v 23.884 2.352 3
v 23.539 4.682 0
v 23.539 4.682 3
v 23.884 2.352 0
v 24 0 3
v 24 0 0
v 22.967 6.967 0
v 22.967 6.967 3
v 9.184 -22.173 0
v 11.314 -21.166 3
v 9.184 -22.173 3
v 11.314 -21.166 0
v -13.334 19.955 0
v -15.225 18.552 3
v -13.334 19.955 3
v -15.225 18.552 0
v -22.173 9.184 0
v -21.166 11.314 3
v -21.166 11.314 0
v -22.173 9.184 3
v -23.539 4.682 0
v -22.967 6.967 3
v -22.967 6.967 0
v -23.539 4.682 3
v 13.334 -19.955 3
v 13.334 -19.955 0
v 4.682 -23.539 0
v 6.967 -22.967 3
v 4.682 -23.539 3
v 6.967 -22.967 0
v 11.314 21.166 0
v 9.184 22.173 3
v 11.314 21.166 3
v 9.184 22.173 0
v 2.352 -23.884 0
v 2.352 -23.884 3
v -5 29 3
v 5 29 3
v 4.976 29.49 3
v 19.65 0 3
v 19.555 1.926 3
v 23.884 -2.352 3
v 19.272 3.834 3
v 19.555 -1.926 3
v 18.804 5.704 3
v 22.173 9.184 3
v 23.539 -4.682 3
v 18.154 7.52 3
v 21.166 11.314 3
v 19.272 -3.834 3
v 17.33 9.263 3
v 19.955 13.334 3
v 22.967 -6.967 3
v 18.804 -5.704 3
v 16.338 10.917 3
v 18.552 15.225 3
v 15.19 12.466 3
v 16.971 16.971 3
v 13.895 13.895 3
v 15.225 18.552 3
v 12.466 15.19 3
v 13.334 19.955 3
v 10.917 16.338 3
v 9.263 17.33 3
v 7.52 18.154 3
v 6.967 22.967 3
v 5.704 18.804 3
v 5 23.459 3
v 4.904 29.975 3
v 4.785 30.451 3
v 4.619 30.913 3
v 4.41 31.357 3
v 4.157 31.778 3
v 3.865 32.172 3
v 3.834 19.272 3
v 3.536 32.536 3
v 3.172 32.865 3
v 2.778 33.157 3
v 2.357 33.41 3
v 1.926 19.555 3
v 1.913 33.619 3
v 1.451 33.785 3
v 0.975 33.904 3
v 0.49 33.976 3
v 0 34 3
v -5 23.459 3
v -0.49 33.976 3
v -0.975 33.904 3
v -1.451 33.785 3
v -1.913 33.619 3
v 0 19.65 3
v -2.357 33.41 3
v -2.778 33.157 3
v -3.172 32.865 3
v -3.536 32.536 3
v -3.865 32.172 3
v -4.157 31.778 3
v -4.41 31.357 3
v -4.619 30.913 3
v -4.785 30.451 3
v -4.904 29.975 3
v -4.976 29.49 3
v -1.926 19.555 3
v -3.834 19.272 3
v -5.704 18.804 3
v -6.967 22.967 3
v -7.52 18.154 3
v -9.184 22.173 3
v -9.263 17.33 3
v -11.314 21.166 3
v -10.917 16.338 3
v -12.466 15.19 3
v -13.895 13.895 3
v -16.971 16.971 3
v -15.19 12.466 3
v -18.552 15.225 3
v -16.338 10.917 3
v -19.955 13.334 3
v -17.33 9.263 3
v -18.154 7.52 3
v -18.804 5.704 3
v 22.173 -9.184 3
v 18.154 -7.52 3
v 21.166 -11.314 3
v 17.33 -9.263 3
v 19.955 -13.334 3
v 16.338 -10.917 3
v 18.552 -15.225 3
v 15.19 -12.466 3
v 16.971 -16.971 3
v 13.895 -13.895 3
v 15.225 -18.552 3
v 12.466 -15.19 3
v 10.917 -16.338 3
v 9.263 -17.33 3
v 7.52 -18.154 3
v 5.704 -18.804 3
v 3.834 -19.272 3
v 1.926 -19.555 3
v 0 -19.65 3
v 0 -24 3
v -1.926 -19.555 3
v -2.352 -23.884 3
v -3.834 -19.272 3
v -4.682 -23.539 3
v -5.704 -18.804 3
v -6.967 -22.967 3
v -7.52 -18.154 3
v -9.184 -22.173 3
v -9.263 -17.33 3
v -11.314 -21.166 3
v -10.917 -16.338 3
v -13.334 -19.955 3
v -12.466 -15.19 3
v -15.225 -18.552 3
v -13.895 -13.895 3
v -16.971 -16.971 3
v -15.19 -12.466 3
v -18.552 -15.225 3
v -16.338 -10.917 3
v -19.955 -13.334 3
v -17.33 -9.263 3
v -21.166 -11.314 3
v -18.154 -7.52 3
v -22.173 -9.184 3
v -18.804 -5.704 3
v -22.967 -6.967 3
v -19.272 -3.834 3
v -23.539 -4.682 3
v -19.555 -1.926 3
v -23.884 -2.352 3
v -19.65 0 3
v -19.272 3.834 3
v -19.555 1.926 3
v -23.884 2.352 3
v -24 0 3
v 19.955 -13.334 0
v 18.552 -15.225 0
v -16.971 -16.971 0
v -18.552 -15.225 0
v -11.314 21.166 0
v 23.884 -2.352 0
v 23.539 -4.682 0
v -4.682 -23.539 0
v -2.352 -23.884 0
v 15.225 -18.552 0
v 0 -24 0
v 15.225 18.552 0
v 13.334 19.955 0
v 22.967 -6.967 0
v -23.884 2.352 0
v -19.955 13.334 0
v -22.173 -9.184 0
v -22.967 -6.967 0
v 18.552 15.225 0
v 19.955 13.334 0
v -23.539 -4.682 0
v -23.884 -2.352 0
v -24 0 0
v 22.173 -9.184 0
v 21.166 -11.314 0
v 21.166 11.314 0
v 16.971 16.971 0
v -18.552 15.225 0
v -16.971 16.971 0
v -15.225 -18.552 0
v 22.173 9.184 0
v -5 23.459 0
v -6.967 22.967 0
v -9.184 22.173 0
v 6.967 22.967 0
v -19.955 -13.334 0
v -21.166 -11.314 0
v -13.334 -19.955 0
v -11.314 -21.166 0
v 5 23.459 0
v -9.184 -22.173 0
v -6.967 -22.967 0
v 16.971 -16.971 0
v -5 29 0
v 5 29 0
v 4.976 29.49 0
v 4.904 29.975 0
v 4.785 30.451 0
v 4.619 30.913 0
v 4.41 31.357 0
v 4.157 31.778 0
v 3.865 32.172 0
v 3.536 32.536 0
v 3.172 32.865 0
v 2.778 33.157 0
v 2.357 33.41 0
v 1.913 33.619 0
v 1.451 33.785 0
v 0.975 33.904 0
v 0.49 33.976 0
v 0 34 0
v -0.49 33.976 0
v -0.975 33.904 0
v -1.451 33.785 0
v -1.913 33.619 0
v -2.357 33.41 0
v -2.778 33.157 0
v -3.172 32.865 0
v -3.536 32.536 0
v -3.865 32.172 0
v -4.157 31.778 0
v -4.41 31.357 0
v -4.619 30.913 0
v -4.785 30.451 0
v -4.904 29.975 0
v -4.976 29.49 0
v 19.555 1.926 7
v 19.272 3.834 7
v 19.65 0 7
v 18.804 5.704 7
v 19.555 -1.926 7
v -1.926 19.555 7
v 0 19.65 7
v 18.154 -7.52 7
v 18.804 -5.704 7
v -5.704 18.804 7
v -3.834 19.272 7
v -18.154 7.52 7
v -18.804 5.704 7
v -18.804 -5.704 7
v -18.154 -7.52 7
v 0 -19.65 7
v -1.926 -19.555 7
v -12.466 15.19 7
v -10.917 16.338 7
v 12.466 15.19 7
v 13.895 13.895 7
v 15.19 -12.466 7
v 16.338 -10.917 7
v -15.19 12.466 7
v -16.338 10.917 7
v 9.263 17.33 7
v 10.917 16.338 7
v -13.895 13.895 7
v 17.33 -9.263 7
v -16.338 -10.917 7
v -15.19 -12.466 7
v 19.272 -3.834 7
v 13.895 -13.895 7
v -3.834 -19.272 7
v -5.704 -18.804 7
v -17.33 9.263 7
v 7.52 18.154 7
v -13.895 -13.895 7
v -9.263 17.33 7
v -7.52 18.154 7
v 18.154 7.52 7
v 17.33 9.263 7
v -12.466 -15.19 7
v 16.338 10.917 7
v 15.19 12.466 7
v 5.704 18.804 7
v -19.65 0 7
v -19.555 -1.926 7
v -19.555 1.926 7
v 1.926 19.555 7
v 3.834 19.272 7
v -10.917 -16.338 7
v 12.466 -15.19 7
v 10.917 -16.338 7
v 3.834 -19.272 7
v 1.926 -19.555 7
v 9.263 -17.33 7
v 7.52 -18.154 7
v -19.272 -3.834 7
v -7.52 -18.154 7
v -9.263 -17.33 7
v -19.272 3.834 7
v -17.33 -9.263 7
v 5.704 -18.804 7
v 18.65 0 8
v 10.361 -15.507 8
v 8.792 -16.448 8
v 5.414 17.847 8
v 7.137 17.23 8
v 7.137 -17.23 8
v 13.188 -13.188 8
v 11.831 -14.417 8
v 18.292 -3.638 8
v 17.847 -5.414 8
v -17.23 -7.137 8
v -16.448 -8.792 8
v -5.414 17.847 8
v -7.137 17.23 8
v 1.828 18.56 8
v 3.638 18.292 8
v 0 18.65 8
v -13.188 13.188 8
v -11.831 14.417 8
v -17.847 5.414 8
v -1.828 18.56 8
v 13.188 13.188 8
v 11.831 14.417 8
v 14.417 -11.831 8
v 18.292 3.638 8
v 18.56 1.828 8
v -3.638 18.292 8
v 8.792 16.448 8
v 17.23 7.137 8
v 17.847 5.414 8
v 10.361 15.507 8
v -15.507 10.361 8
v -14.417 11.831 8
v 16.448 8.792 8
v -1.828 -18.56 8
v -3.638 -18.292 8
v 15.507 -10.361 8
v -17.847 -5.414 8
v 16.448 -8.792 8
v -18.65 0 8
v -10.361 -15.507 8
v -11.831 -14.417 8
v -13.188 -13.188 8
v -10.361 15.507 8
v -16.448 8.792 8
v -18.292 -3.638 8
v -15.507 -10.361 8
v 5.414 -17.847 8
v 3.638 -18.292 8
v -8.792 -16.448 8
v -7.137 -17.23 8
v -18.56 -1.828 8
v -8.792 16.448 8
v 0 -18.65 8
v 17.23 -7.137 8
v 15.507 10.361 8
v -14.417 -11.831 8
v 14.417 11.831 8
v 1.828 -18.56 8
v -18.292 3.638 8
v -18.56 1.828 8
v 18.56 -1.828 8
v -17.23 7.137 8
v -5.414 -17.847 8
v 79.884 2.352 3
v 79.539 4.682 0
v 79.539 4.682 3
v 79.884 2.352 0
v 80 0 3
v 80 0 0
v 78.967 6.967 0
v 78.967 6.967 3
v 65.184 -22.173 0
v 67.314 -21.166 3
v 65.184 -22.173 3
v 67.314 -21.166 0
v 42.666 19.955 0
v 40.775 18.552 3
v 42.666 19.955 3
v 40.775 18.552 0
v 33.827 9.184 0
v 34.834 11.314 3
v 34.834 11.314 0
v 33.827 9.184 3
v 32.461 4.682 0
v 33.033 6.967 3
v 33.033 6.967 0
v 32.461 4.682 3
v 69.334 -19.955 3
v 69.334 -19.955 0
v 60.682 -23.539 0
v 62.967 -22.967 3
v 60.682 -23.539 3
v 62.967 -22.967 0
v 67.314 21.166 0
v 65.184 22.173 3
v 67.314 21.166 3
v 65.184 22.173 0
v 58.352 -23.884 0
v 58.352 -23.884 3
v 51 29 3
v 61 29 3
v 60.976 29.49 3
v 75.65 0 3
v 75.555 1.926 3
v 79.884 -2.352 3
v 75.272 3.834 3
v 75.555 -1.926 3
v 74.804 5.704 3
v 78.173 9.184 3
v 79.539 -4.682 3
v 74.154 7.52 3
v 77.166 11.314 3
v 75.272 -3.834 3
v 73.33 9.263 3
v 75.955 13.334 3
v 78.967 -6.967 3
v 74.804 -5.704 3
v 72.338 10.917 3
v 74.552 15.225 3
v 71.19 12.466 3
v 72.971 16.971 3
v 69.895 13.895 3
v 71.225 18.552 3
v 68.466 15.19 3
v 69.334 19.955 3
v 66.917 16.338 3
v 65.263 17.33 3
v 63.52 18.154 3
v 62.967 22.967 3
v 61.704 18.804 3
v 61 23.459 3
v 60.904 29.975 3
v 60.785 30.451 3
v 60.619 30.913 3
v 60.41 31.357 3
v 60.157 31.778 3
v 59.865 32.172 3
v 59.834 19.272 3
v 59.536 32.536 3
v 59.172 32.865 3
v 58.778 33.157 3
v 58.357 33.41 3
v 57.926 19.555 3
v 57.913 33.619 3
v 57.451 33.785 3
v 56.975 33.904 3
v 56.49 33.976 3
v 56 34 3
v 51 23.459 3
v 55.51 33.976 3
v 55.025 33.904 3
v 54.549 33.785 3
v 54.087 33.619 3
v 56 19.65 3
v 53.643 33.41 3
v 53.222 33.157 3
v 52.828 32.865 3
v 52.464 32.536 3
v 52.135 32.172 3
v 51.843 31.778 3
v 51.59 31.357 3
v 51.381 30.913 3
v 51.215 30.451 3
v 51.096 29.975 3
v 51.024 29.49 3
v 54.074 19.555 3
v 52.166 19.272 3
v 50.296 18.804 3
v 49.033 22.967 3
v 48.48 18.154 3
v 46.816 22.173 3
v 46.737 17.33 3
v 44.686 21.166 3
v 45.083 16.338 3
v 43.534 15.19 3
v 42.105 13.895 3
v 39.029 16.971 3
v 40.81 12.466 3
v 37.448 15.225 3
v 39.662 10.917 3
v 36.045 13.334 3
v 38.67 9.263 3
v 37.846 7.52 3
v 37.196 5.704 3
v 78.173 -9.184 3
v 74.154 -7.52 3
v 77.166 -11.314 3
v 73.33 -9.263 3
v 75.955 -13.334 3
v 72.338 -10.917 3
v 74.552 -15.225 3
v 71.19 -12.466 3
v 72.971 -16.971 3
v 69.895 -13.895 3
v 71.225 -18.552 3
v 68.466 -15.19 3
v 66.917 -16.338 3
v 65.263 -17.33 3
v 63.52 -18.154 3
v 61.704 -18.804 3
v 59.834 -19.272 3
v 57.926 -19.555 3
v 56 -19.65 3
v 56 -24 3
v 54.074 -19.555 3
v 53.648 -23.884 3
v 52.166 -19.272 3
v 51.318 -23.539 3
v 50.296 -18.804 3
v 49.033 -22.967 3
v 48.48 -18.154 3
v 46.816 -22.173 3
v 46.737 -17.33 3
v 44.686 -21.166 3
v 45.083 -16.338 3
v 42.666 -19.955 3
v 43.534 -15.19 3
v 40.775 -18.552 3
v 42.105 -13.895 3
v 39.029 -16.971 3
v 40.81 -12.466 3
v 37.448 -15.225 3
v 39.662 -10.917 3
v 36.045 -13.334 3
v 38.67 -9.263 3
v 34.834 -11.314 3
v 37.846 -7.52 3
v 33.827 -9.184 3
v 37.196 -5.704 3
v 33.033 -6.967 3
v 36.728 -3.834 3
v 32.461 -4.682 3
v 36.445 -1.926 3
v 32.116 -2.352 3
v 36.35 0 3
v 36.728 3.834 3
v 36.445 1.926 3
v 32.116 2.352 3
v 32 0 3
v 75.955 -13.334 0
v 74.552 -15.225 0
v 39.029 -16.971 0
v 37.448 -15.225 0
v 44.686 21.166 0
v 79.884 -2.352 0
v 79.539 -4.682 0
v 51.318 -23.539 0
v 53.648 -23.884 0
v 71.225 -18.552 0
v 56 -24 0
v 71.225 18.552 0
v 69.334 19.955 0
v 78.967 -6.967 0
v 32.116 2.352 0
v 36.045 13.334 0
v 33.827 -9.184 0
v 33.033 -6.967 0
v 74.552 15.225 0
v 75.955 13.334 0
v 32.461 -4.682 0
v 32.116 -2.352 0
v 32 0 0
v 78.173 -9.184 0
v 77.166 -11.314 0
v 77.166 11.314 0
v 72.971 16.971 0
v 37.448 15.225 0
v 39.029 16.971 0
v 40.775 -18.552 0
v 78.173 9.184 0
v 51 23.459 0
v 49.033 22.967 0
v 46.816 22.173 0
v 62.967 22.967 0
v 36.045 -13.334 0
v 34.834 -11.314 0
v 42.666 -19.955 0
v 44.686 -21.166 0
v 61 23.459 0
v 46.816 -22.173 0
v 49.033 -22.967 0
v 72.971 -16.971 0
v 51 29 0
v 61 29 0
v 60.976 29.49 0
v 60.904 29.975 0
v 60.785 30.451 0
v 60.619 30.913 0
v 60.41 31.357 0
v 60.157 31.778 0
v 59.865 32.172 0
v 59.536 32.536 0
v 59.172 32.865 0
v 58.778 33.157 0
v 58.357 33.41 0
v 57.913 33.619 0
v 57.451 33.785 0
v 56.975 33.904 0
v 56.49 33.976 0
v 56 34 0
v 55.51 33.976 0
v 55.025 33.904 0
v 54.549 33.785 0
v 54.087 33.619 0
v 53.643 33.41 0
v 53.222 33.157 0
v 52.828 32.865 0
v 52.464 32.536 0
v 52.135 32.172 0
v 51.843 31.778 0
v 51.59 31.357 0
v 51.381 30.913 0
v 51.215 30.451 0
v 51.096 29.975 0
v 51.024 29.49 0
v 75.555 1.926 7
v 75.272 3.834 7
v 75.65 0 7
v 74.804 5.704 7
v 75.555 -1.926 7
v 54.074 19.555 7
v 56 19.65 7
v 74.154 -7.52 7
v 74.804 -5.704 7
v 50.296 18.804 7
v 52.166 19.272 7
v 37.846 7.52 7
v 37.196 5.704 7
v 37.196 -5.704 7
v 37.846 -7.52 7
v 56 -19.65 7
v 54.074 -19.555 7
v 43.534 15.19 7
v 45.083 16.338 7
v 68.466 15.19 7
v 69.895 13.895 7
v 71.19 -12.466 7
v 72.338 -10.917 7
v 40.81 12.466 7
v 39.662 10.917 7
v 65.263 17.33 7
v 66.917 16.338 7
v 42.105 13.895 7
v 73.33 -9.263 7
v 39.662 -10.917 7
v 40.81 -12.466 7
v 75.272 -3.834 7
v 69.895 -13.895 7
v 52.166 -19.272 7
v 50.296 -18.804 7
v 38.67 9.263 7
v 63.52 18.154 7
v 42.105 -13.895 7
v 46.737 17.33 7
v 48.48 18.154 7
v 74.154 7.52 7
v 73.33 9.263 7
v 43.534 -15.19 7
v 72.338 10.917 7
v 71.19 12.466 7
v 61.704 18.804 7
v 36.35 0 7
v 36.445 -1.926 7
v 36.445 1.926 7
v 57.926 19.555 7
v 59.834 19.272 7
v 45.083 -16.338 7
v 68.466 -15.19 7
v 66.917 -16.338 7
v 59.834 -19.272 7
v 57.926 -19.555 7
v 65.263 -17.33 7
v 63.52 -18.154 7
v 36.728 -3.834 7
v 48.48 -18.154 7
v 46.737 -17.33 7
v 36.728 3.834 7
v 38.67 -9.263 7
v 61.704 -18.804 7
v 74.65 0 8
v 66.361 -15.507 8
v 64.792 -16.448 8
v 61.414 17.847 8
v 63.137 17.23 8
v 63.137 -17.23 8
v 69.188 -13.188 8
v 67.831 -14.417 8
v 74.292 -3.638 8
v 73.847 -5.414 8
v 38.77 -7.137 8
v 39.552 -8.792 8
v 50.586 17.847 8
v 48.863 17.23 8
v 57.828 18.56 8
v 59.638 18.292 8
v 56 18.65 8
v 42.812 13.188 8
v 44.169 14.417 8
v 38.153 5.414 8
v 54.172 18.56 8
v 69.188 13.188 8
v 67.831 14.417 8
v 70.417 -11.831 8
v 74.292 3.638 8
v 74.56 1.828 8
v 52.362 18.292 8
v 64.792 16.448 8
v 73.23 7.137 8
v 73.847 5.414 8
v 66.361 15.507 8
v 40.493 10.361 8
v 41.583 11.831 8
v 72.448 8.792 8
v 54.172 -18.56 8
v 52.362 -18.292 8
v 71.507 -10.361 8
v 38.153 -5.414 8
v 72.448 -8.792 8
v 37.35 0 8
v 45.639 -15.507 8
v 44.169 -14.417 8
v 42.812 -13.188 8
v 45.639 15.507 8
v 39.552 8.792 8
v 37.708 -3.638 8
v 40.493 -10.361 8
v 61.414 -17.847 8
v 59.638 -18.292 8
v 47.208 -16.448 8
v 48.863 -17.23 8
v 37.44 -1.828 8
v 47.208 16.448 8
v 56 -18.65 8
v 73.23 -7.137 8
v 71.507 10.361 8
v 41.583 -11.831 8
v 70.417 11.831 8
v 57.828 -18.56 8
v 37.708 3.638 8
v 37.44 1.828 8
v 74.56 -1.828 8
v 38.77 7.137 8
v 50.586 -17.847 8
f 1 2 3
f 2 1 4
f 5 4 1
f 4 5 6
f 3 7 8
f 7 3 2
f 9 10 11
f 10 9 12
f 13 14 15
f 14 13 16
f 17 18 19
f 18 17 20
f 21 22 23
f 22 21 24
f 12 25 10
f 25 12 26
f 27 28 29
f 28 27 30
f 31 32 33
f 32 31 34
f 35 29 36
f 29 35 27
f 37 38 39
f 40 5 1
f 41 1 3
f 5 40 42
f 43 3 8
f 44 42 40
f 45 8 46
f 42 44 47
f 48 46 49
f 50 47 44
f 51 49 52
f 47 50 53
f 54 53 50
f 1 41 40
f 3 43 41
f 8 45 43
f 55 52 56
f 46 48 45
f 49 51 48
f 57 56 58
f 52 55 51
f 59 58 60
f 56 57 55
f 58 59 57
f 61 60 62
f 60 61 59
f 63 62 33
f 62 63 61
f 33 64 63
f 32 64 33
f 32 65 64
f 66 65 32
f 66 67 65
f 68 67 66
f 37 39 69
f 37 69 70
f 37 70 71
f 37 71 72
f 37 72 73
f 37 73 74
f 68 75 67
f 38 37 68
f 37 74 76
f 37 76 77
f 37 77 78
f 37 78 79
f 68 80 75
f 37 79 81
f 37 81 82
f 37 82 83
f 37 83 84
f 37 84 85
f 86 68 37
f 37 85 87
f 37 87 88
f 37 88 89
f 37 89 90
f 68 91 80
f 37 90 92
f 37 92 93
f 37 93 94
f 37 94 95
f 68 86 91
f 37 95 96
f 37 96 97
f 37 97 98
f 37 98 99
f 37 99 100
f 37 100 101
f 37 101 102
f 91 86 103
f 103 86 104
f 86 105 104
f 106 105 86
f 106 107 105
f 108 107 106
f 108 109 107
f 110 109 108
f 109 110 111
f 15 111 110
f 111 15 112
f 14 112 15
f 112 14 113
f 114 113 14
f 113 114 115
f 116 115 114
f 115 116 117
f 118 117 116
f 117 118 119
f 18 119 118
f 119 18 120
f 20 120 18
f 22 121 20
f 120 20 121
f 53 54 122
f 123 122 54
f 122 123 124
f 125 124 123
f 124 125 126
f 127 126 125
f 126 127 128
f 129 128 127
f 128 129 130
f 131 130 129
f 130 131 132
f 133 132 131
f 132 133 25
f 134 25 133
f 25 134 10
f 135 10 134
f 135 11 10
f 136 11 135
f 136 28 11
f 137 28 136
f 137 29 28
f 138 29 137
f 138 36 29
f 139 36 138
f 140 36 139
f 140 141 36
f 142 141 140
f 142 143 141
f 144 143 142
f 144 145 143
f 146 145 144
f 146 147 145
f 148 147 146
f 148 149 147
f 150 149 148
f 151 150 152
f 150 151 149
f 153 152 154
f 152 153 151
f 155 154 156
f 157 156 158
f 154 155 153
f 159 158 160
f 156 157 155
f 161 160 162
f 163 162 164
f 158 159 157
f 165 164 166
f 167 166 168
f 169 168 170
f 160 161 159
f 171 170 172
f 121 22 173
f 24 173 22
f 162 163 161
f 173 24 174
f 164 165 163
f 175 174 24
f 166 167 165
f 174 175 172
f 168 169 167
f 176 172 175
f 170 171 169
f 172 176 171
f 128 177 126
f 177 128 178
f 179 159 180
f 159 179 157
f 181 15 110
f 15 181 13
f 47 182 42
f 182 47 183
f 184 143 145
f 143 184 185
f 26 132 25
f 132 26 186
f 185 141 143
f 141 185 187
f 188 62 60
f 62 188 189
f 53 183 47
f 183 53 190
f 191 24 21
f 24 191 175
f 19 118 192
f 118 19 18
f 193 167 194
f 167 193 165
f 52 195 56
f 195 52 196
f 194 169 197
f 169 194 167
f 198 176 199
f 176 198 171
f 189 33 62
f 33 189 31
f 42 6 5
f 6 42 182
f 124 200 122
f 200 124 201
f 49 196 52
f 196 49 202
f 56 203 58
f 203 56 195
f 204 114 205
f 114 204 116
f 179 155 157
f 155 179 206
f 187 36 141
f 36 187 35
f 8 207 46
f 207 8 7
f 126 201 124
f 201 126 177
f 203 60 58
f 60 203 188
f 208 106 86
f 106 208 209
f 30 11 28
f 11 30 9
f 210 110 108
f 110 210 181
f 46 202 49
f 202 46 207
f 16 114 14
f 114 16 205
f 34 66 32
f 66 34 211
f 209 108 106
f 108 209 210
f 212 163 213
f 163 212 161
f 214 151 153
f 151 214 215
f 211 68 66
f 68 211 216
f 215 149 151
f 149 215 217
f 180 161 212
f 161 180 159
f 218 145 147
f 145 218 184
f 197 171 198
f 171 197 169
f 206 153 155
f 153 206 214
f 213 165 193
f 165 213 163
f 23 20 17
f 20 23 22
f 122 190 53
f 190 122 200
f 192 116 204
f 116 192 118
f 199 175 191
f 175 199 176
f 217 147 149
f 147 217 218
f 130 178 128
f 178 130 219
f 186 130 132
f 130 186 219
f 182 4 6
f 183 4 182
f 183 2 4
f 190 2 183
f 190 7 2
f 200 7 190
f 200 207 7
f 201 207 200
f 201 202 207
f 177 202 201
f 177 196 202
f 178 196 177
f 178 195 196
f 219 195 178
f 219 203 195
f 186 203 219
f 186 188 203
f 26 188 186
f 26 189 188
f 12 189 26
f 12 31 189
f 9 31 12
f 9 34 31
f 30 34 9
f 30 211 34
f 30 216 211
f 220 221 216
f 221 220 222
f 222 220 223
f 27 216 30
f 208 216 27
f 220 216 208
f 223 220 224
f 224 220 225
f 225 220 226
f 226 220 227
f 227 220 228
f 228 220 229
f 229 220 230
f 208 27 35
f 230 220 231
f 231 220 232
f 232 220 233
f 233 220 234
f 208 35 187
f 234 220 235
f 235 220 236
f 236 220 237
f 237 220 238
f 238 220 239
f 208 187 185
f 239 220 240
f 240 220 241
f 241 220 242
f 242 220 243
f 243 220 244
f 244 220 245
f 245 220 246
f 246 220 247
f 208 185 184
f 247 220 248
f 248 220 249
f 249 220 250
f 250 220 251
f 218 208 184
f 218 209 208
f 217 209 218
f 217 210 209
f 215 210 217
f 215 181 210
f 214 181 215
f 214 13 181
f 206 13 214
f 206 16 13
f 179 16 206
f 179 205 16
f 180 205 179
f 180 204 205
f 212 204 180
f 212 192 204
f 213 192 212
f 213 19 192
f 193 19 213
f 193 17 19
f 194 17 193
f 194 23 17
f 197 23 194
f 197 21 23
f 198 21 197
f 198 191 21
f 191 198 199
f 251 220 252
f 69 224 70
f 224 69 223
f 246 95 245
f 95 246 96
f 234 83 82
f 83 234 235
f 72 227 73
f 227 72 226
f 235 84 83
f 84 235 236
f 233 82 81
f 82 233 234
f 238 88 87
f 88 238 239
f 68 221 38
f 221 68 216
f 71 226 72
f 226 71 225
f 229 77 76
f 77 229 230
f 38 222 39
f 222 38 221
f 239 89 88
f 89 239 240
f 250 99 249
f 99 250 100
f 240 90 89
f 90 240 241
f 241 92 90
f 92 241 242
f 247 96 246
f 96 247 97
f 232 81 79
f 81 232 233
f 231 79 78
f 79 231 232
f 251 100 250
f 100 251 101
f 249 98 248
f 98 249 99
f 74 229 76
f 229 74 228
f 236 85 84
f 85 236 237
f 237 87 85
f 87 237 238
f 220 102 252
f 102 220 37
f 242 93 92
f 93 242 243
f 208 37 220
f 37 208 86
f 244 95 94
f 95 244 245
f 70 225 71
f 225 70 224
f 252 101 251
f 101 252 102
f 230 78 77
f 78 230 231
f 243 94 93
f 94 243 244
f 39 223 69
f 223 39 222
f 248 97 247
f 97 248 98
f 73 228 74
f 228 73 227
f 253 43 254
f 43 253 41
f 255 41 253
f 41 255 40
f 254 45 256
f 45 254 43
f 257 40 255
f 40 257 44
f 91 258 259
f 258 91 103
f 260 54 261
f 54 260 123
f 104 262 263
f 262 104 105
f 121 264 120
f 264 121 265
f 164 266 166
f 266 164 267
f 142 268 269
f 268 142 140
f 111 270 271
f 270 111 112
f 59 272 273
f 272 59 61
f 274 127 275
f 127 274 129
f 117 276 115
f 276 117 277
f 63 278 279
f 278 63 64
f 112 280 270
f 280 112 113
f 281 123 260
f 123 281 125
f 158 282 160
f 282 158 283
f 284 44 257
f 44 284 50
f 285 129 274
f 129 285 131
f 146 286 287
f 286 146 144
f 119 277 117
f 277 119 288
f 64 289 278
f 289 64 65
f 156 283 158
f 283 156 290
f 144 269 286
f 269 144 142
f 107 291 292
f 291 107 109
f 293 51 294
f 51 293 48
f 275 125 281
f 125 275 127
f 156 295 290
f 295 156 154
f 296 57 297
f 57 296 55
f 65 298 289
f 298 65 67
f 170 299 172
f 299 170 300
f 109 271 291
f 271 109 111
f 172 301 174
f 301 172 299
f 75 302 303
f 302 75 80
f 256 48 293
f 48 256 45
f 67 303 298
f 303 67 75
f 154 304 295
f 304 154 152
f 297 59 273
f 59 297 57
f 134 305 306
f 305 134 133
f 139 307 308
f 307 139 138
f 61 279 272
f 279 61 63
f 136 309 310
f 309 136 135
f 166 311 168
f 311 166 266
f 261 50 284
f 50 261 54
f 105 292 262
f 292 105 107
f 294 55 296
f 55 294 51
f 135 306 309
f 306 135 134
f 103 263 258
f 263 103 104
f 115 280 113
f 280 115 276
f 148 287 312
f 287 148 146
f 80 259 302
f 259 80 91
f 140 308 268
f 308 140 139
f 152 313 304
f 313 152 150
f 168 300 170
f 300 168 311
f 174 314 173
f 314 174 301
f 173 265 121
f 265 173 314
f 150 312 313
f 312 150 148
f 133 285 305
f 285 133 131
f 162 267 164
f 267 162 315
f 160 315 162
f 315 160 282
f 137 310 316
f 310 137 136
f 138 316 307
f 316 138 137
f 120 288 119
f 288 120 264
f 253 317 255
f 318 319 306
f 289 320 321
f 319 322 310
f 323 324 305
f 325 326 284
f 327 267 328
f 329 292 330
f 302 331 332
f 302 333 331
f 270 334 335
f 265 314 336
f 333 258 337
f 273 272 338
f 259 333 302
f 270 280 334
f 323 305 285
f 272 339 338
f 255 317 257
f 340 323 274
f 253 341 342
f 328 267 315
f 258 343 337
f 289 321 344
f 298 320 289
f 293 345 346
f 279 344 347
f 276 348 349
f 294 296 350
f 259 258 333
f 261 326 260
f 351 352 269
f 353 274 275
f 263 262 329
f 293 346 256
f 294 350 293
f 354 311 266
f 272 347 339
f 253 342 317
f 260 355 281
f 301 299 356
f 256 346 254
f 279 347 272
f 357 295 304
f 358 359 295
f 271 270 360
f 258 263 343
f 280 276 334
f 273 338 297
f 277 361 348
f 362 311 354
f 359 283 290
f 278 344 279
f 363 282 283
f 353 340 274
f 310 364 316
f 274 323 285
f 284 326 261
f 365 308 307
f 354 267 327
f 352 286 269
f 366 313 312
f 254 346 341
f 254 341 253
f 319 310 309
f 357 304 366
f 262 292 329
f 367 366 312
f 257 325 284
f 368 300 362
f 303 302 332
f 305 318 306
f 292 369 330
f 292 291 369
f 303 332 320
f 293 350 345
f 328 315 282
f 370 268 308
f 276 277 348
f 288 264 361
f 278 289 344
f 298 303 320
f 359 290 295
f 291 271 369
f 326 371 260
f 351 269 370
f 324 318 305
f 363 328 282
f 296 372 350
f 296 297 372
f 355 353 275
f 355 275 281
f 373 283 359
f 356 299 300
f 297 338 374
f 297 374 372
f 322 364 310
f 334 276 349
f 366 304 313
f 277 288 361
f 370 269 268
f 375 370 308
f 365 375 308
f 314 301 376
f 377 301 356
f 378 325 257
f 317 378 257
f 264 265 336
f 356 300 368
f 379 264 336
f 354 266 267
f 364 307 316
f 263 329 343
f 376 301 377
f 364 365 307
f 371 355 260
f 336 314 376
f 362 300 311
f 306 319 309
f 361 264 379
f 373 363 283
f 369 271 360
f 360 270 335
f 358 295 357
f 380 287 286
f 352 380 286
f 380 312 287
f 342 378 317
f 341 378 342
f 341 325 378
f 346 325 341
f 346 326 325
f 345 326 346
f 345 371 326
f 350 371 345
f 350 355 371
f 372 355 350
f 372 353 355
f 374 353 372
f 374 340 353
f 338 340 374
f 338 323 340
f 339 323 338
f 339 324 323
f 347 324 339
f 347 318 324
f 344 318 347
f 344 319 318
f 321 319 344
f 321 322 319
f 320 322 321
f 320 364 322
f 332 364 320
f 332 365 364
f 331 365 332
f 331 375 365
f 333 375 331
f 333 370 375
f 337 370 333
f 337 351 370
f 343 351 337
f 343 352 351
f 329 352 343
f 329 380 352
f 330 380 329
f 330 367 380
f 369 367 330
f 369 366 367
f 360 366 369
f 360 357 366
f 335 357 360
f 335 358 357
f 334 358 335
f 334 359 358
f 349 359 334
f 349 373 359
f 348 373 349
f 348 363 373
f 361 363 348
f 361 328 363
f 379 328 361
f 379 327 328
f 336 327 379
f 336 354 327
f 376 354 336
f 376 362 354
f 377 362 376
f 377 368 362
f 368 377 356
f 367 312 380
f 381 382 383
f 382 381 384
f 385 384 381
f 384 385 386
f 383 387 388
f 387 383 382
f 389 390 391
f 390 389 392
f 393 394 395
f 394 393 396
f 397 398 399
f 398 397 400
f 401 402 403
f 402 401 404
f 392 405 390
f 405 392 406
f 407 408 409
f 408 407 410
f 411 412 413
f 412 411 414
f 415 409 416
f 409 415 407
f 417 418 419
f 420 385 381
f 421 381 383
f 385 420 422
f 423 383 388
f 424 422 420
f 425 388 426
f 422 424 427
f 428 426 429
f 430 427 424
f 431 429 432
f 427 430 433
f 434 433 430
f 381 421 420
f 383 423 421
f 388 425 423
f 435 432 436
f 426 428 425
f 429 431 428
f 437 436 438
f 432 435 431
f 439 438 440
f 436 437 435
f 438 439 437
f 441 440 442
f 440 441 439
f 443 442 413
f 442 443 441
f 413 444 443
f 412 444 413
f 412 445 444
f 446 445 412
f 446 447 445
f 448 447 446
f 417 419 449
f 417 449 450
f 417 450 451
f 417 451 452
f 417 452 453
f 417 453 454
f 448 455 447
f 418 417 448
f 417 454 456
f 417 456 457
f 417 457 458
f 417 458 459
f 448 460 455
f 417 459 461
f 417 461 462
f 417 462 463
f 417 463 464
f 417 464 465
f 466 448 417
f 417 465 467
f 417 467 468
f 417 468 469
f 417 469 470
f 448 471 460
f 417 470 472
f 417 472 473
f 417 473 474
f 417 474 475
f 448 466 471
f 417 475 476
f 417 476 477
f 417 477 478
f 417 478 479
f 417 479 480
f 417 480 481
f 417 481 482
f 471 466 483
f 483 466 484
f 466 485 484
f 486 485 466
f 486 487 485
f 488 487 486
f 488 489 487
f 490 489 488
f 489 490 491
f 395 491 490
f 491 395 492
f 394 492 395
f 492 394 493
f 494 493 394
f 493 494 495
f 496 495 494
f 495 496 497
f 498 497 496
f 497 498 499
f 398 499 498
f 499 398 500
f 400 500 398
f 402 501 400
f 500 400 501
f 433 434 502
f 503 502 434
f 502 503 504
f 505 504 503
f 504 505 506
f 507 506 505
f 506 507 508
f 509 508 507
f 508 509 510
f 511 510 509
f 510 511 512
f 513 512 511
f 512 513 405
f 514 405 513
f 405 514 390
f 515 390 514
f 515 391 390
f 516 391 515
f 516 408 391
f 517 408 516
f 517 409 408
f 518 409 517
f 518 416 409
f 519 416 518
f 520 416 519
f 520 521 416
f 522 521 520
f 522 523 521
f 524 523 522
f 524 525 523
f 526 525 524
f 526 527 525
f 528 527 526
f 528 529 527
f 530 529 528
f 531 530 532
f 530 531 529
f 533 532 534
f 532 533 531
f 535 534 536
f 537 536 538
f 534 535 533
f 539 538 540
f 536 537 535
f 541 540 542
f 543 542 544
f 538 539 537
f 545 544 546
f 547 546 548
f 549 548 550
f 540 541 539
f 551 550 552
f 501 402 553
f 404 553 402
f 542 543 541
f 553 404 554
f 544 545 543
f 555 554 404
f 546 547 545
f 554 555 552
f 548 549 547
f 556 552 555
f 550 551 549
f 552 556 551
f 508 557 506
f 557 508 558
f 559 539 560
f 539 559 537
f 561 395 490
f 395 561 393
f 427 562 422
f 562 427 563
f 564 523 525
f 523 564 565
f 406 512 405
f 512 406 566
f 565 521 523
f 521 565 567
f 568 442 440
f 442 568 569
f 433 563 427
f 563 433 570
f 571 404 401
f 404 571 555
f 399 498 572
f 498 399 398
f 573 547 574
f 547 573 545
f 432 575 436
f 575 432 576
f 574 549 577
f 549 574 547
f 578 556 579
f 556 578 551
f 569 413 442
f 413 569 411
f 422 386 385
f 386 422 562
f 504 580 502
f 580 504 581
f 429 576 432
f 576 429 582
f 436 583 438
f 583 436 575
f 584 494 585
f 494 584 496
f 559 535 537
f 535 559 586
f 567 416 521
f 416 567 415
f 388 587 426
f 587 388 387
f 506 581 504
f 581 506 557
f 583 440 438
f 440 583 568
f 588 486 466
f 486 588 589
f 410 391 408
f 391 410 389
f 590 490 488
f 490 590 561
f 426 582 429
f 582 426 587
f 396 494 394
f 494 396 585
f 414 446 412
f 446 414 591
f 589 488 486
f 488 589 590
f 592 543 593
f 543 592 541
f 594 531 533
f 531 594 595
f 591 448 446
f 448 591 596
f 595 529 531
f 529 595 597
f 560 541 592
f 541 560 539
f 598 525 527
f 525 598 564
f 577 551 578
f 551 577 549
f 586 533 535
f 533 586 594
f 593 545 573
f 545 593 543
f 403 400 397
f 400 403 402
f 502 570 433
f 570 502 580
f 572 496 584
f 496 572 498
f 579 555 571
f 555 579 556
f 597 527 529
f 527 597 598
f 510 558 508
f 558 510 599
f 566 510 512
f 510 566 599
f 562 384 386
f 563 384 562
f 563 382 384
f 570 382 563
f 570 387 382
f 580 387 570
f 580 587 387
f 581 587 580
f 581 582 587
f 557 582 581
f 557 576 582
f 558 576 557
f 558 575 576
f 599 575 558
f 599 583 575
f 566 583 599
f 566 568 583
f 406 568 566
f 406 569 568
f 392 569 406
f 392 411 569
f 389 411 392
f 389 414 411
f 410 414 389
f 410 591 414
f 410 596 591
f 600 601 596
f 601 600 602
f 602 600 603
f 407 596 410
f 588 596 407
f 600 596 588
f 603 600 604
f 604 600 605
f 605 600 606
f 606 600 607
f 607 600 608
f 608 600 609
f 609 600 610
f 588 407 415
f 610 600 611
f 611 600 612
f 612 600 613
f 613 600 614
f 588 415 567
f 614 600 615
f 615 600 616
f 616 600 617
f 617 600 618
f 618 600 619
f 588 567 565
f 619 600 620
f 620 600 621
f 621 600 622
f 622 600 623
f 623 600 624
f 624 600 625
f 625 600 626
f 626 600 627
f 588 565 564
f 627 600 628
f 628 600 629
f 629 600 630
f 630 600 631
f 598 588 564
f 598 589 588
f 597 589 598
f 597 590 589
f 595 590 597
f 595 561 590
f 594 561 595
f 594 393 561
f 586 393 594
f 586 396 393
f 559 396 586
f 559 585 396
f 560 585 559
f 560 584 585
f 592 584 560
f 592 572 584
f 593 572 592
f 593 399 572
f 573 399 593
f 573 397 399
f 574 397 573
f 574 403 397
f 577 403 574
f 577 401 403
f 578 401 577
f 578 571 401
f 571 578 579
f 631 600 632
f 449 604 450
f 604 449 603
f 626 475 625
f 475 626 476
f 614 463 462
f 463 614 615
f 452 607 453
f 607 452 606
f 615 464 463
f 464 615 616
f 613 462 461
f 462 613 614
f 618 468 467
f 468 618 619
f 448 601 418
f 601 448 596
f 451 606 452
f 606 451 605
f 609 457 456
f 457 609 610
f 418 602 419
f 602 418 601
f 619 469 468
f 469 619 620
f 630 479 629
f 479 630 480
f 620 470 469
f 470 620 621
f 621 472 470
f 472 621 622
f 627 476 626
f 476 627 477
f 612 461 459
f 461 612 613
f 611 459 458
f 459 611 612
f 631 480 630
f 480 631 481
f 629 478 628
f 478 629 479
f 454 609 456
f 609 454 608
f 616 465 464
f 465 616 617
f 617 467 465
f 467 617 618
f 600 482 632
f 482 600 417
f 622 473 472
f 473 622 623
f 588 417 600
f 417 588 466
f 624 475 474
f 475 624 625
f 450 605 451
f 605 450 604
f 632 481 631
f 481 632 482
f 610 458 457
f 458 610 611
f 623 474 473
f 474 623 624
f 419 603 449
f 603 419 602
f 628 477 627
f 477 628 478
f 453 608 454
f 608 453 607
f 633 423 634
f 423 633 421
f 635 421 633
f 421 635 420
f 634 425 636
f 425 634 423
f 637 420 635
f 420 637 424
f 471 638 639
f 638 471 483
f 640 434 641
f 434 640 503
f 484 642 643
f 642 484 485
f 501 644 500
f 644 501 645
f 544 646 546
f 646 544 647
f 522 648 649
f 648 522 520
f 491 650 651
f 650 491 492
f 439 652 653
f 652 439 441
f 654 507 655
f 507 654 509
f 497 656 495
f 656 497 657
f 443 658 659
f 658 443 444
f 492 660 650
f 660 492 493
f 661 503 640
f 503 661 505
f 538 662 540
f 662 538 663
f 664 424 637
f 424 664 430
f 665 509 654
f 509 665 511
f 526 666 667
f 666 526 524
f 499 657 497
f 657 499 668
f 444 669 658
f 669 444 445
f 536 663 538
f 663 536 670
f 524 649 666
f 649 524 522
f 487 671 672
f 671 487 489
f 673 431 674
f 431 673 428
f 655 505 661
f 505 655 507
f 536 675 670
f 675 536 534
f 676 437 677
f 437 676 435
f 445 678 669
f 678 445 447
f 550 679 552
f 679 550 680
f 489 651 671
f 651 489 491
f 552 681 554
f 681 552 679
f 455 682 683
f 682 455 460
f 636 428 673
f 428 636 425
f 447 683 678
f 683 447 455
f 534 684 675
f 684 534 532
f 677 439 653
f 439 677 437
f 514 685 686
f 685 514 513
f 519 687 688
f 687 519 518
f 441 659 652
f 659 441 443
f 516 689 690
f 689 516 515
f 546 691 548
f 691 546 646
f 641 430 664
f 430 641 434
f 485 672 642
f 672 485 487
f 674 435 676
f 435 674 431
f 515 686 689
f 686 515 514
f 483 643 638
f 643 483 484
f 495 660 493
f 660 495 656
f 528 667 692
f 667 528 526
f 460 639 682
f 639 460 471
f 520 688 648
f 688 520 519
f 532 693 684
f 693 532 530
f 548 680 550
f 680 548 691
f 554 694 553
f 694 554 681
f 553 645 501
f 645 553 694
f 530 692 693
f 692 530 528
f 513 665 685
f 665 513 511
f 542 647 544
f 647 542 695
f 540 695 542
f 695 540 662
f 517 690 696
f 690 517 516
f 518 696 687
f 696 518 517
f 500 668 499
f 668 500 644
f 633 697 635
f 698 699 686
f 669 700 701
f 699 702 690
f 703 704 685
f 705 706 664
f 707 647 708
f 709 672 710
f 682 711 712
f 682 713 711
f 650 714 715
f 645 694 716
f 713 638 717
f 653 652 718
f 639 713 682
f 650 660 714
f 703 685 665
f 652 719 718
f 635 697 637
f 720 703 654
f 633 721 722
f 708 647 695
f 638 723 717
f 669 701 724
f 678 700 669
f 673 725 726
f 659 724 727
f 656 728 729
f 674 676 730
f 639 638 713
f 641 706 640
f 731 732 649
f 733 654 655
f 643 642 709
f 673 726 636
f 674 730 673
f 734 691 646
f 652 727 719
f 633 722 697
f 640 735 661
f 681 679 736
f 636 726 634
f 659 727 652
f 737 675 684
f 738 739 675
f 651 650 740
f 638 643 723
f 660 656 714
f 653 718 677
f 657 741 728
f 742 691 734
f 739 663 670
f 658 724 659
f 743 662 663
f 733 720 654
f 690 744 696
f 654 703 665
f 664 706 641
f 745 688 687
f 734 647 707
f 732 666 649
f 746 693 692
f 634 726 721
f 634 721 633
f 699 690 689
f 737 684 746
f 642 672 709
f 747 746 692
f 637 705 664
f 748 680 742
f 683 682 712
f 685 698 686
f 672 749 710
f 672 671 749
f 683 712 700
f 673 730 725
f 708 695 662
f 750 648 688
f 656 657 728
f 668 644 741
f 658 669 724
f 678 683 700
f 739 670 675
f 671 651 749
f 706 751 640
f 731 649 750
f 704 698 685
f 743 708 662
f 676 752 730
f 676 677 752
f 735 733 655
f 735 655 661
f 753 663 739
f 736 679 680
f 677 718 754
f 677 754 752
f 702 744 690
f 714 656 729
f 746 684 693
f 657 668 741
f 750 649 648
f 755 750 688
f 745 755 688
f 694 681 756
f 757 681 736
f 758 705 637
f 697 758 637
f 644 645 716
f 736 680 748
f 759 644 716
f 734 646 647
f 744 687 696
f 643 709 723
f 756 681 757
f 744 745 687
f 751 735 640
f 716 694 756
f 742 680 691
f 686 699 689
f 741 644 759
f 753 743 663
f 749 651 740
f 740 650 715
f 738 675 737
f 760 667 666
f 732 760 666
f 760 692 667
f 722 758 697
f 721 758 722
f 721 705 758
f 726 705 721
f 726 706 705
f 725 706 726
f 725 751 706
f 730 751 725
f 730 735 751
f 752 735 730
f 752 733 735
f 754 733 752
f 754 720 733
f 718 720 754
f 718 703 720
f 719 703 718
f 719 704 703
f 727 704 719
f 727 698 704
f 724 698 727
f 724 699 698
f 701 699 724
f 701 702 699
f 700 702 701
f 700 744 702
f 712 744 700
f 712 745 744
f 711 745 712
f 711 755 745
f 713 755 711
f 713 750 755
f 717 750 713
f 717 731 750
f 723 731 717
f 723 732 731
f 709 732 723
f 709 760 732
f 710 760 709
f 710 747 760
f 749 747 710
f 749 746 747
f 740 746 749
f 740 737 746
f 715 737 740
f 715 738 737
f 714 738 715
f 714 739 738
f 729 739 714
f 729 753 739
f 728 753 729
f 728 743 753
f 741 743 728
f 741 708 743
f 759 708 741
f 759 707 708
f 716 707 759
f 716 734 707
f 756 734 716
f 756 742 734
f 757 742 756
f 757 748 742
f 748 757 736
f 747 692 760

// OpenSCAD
// file: lib/caps.scad
// Print broad OUTSIDE faces on the bed, plugs up; flip for use. No supported handles.
module slit_cap() {
    union() {
        hull() for (x = [-entry_straight / 2, entry_straight / 2])
            translate([x, 0, 0]) cylinder(h = cap_lid_thickness, r = slit_cap_radius);
        translate([entry_straight / 2, -slit_lid_width / 2, 0])
            cube([slit_cap_radius + cap_tab_length, slit_lid_width, cap_lid_thickness]);
        // Match the actual entry's capsule ends and taper, inset on all sides.
        hull() {
            capsule_slice(-entry_straight / 2, entry_straight / 2, 0,
                cap_lid_thickness - eps, mouth_radius - cap_clearance);
            capsule_slice(-entry_straight / 2, entry_straight / 2, 0,
                cap_lid_thickness + top_round, entry_mouth_width / 2 - cap_clearance);
        }
        hull() {
            capsule_slice(-entry_straight / 2, entry_straight / 2, 0,
                cap_lid_thickness + top_round - eps, entry_mouth_width / 2 - cap_clearance);
            capsule_slice(-entry_straight / 2, entry_straight / 2, 0,
                cap_lid_thickness + slit_cap_rib_depth - eps,
                entry_radius_at_depth(slit_cap_rib_depth) - cap_clearance);
        }
    }
}
module inlet_cap() {
    r = inlet_opening_diameter / 2 - cap_clearance;
    chamfer = min(1, inlet_plug_length / 3);
    union() {
        cylinder(h = cap_lid_thickness, r = inlet_cap_radius);
        hull() for (y = [inlet_cap_radius - 5, inlet_cap_radius + cap_tab_length - 5])
            translate([0, y, 0]) cylinder(h = cap_lid_thickness, r = 5);
        translate([0, 0, cap_lid_thickness - eps])
            cylinder(h = inlet_plug_length - chamfer + eps, r = r);
        translate([0, 0, cap_lid_thickness + inlet_plug_length - chamfer])
            cylinder(h = chamfer, r1 = r, r2 = r - chamfer);
    }
}
module installed_slit_cap(i) {
    translate([outer_width / 2, slot_yc(i), outer_height + cap_lid_thickness])
        rotate([180, 0, i == 0 ? 0 : 180]) slit_cap();
}
module installed_inlet_cap(i) {
    inlet_frame(i) translate([0, -inlet_offset, outer_height + cap_lid_thickness])
        rotate([180, 0, 0]) inlet_cap();
}
module slit_cap_plate() {
    for (i = [0 : chamber_count - 1])
        translate([0, i * (slit_lid_width + plate_gap), 0]) slit_cap();
}
module inlet_cap_plate() {
    for (i = [0 : chamber_count - 1])
        translate([i * (2 * inlet_cap_radius + plate_gap), 0, 0]) inlet_cap();
}
// file: lib/geometry.scad
// Helpers use dimensions loaded by parameters.scad.
module capsule_slice(x1, x2, yc, z, r) {
    hull() for (x = [x1, x2]) translate([x, yc, z]) cylinder(h = eps, r = r);
}
module rounded_rect_slice(x0, y0, w, d, z, r) {
    hull() for (x = [x0 + r, x0 + w - r]) for (y = [y0 + r, y0 + d - r])
        translate([x, y, z]) cylinder(h = eps, r = r);
}
module inlet_frame(i) {
    translate([outer_width / 2, i == 0 ? 0 : outer_depth, 0])
        rotate([0, 0, i == 0 ? 0 : 180]) children();
}
module entry_slice(i, z, r) {
    capsule_slice(entry_centres[0], entry_centres[1], slot_yc(i), z, r);
}
// main file
// Complete set of fill caps: flat outside faces on bed, plugs up.
include <lib/parameters.scad>
include <lib/geometry.scad>
include <lib/caps.scad>
validate_parameters() inlet_cap_plate();
